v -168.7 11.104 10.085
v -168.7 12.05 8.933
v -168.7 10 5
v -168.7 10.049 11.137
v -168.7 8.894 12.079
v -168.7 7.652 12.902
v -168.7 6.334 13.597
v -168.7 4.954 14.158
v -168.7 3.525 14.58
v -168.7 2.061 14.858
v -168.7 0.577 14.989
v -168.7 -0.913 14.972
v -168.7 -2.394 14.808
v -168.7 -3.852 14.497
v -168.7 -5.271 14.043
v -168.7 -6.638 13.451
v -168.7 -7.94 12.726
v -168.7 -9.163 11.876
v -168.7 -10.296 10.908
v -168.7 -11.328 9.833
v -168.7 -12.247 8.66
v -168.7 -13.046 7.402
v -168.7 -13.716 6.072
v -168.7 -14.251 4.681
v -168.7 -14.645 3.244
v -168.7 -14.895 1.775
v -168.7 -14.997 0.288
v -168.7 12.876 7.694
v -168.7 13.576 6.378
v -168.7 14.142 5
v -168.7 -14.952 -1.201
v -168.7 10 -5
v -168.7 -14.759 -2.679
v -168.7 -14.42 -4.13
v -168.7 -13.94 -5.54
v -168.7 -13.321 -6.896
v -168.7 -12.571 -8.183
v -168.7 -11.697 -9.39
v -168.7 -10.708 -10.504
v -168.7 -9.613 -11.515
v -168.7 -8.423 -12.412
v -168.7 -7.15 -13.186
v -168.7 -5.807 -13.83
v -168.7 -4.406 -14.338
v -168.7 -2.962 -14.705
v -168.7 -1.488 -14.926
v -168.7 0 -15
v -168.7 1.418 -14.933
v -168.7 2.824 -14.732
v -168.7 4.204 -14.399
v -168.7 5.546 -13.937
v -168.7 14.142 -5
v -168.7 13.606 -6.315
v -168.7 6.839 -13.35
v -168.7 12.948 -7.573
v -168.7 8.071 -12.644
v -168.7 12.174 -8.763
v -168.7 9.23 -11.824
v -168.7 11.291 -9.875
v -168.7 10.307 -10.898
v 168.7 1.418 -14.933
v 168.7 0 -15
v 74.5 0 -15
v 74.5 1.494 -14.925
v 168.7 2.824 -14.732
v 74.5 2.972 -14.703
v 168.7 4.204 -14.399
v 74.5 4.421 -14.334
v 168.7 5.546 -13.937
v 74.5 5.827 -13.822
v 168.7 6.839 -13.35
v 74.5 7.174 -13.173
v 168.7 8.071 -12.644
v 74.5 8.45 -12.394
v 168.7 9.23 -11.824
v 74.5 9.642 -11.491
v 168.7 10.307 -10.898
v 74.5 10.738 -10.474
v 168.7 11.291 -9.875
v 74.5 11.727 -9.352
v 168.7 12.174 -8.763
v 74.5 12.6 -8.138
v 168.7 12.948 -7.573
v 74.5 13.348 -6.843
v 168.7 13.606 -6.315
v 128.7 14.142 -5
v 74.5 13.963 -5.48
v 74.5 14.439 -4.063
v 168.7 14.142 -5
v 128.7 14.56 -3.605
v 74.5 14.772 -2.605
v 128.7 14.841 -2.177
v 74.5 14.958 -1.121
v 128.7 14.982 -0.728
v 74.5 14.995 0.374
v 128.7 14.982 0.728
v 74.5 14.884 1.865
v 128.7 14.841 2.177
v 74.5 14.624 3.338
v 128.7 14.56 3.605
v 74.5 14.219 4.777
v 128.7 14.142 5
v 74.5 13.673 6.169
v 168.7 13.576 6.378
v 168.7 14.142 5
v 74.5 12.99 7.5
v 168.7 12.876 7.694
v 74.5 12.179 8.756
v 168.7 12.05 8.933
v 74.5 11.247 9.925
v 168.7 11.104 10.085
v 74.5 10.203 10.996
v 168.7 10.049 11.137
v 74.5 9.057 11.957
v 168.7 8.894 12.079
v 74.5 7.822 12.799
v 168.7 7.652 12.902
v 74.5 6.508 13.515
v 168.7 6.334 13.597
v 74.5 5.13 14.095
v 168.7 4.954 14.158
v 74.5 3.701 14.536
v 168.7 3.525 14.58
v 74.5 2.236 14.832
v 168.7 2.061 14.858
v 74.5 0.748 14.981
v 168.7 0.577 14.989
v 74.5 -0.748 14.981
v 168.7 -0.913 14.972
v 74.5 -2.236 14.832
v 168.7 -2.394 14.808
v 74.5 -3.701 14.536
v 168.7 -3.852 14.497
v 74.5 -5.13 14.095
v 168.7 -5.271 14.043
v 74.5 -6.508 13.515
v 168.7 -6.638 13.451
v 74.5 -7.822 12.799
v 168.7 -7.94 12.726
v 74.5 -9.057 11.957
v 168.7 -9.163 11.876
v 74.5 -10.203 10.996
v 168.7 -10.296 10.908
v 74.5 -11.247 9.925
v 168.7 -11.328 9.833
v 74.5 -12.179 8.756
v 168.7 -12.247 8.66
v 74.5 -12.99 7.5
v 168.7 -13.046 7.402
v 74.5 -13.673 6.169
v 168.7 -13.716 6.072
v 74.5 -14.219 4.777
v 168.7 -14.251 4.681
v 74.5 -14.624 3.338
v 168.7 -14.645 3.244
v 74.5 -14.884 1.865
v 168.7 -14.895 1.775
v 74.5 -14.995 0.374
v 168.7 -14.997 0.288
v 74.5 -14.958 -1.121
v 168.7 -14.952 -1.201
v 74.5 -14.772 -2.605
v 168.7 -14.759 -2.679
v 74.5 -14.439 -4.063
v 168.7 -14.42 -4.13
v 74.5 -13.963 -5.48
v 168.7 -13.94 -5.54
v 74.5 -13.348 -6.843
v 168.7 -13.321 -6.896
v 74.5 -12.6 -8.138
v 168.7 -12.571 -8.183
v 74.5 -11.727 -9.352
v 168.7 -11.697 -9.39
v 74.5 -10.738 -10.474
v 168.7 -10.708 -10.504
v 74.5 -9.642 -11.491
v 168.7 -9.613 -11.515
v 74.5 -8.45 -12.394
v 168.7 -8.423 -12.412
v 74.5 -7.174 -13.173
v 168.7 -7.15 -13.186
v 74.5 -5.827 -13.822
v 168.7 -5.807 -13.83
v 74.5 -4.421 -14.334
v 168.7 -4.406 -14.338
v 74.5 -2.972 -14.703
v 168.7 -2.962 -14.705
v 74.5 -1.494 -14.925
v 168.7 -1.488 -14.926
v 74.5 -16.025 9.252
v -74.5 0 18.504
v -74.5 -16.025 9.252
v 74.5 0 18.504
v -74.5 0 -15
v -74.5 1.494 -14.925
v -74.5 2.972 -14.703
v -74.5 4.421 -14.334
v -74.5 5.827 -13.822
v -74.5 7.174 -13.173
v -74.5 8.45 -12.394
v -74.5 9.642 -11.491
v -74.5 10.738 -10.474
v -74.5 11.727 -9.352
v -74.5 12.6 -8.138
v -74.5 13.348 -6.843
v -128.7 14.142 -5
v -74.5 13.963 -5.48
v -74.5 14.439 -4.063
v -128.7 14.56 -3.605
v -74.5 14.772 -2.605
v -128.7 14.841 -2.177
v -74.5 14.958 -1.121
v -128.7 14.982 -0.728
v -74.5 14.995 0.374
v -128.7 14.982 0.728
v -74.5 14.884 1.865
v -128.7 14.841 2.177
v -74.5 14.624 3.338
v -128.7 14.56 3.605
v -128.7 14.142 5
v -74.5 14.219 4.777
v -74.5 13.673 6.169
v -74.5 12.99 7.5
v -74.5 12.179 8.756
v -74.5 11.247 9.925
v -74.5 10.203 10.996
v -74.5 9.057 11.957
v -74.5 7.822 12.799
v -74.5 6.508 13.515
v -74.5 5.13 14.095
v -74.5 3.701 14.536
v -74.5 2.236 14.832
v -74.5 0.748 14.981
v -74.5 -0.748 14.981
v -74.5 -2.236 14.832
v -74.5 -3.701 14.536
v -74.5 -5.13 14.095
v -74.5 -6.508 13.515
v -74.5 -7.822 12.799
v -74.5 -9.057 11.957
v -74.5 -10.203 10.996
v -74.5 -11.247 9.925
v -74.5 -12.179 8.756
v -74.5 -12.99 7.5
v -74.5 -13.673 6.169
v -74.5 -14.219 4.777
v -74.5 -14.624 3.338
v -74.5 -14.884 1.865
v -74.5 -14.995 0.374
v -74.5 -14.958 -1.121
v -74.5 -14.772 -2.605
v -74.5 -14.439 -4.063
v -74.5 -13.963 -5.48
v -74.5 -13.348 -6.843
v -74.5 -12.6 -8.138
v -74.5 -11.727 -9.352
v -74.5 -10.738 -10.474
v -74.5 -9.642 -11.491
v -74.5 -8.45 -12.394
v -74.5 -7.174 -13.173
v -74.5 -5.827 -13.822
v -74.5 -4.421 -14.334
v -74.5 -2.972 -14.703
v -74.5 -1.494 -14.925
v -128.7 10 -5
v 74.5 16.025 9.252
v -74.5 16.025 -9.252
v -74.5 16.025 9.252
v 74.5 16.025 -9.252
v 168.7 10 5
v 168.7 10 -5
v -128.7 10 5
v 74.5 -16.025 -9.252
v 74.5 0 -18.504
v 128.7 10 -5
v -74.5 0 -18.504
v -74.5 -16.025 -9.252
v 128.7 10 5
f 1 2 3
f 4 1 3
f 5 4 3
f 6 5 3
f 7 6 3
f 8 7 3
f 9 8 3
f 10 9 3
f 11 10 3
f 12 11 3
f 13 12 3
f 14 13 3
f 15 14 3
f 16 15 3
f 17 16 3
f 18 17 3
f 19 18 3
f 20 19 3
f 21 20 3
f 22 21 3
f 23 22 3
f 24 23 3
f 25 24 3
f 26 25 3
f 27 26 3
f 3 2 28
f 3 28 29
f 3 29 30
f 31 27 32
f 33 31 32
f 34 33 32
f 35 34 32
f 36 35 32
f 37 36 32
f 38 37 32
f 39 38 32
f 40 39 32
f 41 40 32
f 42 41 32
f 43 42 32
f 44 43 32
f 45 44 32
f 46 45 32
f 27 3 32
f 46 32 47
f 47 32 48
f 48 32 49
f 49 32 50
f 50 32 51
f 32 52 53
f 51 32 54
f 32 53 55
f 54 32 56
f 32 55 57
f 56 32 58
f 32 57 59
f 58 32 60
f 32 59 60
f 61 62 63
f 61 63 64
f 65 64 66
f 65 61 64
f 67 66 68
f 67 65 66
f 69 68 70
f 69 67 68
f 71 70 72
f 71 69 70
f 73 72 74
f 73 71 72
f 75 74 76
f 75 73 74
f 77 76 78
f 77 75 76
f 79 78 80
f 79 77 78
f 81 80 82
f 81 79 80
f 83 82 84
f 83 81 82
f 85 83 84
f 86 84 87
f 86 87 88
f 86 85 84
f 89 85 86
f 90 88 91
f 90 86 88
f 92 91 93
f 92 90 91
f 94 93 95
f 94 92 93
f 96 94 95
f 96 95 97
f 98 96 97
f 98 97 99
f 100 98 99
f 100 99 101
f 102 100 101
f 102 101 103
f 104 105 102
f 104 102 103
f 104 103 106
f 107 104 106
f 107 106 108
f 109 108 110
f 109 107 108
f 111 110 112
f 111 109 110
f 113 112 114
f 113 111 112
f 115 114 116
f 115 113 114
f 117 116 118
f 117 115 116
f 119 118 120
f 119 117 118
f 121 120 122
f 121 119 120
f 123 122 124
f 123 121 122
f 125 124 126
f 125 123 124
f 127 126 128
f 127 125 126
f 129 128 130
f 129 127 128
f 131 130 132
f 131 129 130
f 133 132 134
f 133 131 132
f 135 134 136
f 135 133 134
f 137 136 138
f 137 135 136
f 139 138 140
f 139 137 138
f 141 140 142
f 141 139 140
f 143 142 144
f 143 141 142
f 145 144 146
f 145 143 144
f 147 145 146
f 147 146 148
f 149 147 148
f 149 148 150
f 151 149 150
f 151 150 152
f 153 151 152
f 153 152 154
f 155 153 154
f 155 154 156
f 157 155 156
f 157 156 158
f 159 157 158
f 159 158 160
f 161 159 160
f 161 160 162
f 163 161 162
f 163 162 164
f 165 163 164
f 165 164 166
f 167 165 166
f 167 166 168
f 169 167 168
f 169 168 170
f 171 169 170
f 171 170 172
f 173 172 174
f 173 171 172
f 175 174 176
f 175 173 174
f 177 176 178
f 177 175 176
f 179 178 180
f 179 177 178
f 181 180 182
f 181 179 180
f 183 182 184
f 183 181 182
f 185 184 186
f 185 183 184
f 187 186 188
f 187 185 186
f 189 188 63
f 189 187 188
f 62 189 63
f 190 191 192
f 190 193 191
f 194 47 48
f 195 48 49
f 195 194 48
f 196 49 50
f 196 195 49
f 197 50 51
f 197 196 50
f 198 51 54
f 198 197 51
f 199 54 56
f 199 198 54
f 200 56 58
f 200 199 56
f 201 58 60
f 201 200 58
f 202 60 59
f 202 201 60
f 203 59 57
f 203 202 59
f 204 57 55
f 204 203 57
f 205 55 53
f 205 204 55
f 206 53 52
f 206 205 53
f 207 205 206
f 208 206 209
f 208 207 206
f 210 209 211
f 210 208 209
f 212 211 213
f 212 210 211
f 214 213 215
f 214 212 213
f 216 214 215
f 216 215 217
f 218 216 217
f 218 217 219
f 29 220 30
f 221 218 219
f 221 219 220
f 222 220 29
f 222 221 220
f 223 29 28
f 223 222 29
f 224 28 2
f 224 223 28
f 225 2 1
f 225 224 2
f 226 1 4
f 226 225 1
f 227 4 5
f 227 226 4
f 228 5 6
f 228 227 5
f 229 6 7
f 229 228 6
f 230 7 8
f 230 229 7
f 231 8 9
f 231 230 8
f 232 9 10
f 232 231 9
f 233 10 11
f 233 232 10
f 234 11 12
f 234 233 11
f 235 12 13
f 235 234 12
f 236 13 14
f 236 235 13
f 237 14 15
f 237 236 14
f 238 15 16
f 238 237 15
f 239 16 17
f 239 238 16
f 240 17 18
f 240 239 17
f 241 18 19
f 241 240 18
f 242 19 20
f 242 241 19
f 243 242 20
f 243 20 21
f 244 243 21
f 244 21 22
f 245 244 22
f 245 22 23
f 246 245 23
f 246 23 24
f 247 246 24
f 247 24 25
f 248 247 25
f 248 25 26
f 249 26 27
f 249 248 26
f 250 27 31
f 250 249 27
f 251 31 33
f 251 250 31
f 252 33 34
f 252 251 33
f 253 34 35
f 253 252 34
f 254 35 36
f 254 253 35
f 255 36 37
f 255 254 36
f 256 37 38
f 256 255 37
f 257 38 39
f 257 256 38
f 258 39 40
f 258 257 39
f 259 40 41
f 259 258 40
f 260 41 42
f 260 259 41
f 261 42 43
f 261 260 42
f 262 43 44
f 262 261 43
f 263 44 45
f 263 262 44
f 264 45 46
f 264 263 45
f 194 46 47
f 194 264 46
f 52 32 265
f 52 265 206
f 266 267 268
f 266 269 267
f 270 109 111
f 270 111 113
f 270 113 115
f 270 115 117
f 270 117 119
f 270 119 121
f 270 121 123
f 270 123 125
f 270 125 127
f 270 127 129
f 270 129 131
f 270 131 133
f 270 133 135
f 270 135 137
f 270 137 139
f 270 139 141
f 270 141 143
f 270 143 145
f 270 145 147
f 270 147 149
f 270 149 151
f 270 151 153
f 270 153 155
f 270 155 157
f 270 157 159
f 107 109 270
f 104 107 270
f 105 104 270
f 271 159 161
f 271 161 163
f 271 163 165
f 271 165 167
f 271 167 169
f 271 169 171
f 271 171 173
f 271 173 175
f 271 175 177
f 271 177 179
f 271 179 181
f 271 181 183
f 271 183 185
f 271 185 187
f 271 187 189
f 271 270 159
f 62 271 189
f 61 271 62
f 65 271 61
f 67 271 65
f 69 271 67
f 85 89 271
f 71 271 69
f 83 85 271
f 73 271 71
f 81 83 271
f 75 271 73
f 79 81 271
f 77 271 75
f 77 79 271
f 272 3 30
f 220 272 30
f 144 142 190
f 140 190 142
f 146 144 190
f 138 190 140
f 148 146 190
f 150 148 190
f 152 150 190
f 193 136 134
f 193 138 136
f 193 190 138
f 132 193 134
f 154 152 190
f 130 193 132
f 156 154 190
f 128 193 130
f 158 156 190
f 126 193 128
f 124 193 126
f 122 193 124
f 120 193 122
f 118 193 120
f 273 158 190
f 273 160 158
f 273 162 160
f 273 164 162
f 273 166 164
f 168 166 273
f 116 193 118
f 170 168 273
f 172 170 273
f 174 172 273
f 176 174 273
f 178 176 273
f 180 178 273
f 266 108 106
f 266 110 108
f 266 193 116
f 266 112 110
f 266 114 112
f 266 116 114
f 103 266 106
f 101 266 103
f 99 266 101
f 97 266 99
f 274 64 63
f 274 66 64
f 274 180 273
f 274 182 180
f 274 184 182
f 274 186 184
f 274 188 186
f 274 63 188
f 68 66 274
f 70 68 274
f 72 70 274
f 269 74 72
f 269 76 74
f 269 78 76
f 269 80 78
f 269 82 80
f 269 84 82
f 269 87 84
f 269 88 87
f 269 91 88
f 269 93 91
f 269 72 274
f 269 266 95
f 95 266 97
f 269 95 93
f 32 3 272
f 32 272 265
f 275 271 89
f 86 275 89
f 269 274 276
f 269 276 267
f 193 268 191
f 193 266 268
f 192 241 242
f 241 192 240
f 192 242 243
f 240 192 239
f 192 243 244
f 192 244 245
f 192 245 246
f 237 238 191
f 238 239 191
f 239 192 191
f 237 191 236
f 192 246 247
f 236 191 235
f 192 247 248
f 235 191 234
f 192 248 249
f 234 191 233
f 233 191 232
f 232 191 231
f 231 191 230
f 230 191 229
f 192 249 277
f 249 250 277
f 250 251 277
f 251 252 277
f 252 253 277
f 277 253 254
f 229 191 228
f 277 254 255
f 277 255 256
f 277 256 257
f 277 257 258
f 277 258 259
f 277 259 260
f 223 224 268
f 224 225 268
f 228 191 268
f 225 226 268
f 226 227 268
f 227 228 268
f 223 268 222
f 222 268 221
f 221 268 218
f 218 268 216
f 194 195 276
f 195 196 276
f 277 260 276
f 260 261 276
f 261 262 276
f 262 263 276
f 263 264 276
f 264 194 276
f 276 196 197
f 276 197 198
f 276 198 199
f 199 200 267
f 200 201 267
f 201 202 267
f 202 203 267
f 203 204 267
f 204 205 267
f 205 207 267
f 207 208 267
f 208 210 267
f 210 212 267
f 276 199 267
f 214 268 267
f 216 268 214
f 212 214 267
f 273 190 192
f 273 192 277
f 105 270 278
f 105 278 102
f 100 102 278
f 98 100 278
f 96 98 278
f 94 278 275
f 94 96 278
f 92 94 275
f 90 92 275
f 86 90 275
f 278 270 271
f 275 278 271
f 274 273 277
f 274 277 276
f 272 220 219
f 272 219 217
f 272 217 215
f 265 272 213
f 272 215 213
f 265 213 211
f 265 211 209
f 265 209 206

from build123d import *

# Parameters (mm, degrees)
SKETCH1_R           = 15
BOSS_EXTRUDE2_DEPTH = 168.7
BOSS_EXTRUDE3_DEPTH = 74.5
SKETCH3_W           = 10
SKETCH3_H           = 10
CUT_EXTRUDE1_DEPTH  = 40


with BuildPart() as part:
    # Sketch1 → Boss-Extrude2 (new, symmetric)
    with BuildSketch(Plane(origin=(0, 0, 0), x_dir=(0, 0, -1), z_dir=(1, 0, 0))):
        Circle(SKETCH1_R)
    extrude(amount=BOSS_EXTRUDE2_DEPTH, both=True)

    # Sketch2 → Boss-Extrude3 (add, symmetric)
    with BuildSketch(Plane(origin=(0, 0, 0), x_dir=(0, 0, -1), z_dir=(1, 0, 0))):
        Polygon((-18.504076128, 0), (-9.252038064, -16.025), (9.252038064, -16.025), (18.504076128, 0), (9.252038064, 16.025), (-9.252038064, 16.025), align=None)
    extrude(amount=BOSS_EXTRUDE3_DEPTH, both=True)

    # Sketch3 → Cut-Extrude1 (cut)
    with BuildSketch(Plane(origin=(168.7, 0, 0), x_dir=(0, 0, -1), z_dir=(1, 0, 0))):
        with Locations((0, 15)):
            Rectangle(SKETCH3_W, SKETCH3_H)
    cut_extrude1 = extrude(amount=-CUT_EXTRUDE1_DEPTH, mode=Mode.SUBTRACT)

    # Mirror1: Cut-Extrude1 across plane
    add(cut_extrude1.mirror(Plane(origin=(0, 0, 0), x_dir=(0, 0, 1), z_dir=(1, 0, 0))), mode=Mode.SUBTRACT)


solid = part.part
